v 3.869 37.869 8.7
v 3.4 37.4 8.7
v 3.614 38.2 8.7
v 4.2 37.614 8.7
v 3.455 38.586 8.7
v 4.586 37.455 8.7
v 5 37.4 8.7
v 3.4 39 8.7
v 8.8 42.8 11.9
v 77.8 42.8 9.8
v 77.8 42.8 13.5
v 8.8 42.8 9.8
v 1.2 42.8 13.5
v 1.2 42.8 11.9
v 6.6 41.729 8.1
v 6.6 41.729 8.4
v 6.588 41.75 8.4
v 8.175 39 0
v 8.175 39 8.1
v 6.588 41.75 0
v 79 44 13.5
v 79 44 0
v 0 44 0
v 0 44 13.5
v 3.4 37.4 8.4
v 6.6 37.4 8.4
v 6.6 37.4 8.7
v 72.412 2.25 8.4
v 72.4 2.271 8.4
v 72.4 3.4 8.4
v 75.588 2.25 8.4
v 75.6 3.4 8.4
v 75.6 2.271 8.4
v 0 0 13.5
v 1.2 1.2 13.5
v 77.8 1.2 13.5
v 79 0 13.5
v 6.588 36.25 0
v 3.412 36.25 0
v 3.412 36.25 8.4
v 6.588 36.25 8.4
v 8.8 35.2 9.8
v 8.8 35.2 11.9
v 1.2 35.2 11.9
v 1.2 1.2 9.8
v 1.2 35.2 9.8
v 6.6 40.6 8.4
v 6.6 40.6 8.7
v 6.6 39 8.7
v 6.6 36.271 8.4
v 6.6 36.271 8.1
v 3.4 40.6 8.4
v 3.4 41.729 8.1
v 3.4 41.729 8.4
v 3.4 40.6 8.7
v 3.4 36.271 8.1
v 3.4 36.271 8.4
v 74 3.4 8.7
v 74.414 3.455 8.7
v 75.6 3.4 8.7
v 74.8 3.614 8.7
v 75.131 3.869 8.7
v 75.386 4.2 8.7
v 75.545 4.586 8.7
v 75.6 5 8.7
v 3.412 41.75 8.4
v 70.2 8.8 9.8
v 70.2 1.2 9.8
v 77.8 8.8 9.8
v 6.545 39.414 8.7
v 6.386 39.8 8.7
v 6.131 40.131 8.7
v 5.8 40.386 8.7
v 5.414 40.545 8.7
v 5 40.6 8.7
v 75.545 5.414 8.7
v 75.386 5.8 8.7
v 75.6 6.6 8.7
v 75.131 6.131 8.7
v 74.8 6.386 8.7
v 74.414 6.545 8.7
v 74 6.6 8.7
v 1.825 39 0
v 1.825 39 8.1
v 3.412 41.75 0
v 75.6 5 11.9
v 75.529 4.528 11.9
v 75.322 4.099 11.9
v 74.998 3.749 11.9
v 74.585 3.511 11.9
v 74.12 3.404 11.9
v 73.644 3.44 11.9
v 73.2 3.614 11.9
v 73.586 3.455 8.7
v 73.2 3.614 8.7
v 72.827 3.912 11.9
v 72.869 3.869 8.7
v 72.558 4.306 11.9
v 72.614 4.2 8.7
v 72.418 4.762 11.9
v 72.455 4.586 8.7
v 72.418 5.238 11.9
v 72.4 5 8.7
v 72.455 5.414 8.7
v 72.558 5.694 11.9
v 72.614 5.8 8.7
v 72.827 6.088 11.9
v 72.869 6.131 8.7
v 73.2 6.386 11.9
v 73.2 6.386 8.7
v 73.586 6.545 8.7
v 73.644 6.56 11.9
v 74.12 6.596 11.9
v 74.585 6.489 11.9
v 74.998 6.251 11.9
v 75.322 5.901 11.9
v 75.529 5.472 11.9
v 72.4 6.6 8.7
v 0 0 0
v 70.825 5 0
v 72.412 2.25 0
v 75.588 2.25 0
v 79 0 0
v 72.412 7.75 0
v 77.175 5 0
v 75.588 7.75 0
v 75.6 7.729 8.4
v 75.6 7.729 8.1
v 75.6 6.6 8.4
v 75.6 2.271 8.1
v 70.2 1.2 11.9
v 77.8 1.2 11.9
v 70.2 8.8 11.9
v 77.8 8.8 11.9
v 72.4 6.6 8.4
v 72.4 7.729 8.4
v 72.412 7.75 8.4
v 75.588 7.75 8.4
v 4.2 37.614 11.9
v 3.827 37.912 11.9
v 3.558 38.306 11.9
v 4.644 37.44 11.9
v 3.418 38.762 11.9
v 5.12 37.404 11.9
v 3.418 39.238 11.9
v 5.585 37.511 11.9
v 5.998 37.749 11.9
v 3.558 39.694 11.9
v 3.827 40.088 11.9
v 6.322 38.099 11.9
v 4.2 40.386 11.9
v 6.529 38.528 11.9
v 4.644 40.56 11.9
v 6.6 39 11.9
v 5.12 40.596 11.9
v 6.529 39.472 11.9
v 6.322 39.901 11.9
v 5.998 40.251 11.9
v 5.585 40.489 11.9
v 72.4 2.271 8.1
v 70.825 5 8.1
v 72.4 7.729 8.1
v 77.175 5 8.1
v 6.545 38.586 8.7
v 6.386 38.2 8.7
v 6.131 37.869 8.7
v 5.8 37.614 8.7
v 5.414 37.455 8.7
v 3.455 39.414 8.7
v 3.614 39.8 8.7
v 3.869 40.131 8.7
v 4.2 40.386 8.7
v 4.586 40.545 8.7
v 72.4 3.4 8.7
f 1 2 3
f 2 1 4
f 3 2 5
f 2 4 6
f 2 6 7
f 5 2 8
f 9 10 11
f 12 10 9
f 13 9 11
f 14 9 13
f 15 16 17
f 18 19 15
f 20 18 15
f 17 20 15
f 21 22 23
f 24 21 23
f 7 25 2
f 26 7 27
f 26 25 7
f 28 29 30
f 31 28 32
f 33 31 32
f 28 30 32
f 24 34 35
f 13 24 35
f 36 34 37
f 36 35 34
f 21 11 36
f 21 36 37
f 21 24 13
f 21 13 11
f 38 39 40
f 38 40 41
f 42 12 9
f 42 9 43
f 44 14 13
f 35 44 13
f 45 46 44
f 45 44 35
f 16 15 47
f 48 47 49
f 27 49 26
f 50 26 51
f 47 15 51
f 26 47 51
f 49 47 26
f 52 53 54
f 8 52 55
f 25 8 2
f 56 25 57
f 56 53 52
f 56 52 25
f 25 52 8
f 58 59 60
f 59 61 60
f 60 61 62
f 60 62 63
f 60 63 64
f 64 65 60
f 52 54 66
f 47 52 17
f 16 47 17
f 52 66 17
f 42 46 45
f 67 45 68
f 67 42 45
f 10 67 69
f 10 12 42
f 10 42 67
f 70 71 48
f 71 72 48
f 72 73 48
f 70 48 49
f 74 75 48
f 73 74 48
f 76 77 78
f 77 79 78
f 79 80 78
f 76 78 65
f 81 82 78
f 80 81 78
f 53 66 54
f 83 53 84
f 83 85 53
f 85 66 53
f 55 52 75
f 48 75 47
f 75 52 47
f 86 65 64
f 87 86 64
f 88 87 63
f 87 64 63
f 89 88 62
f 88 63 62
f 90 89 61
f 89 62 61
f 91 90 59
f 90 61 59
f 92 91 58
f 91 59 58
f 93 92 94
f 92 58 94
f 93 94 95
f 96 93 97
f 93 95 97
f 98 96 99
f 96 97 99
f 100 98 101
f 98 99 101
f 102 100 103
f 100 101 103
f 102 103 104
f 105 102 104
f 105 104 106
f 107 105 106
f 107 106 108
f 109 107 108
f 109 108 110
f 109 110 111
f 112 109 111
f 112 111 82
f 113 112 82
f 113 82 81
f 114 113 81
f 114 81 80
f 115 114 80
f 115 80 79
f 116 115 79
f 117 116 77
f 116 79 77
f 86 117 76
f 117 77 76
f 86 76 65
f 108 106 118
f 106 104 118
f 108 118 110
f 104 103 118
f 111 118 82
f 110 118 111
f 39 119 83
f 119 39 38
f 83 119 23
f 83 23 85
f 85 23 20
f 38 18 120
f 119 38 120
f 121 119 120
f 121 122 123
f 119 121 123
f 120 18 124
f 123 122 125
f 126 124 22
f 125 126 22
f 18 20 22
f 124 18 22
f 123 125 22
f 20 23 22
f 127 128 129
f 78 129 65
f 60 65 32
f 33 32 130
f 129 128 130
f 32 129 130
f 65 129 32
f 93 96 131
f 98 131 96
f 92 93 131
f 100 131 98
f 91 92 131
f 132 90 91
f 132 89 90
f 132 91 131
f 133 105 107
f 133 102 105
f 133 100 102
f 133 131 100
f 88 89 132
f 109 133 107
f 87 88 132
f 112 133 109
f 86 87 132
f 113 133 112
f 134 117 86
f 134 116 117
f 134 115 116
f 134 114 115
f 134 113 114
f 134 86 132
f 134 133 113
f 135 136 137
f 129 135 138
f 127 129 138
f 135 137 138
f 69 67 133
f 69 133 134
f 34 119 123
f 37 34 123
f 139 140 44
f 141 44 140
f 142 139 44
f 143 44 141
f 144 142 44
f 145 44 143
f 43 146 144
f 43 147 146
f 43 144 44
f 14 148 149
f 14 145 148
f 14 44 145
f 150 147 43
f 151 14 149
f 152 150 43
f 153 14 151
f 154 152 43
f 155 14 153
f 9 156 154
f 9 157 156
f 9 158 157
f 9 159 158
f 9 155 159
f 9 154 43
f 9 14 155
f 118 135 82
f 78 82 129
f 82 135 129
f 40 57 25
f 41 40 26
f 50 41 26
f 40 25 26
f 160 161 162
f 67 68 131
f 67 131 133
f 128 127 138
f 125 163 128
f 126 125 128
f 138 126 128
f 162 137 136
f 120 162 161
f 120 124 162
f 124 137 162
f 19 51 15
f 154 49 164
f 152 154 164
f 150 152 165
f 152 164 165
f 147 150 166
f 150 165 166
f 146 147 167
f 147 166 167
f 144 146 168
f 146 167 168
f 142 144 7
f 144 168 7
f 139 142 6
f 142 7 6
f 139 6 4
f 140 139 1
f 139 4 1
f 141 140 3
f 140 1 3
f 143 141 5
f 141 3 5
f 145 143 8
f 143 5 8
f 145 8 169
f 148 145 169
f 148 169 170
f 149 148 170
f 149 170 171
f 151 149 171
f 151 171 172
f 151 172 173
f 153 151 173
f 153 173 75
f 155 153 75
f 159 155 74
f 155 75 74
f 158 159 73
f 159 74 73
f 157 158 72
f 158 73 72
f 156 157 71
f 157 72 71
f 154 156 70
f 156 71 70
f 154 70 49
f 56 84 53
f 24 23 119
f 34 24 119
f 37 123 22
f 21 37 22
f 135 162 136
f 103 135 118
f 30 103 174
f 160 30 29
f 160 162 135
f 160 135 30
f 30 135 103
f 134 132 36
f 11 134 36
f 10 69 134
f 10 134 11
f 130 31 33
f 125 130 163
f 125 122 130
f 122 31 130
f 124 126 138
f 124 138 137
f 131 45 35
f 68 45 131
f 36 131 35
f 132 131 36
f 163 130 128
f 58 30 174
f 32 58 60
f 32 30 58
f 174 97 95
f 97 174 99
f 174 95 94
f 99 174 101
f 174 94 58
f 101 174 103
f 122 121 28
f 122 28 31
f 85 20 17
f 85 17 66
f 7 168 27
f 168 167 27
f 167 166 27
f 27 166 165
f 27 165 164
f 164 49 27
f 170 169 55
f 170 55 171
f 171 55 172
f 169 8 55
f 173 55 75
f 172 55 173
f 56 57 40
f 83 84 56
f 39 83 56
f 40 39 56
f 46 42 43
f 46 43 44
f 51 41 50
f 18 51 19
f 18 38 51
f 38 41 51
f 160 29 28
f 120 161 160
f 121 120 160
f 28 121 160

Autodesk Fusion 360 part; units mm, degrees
sketch "Sketch2" plane through (0, 0, 0) normal (0, 0, 1) x (1, 0, 0)
  line L0 (0, 0) -> (79, 0)
  line L1 (79, 0) -> (79, 44)
  line L2 (79, 44) -> (0, 44)
  line L3 (0, 44) -> (0, 0)
  line L4 (1.2, 1.2) -> (77.8, 1.2)
  line L5 (77.8, 1.2) -> (77.8, 42.8)
  line L6 (77.8, 42.8) -> (1.2, 42.8)
  line L7 (1.2, 42.8) -> (1.2, 1.2)
  circle A0 centre (5, 39) radius 1.6
  line L8 (6.5877, 41.75) -> (3.4123, 41.75)
  line L9 (3.4123, 41.75) -> (1.8246, 39)
  line L10 (1.8246, 39) -> (3.4123, 36.25)
  line L11 (3.4123, 36.25) -> (6.5877, 36.25)
  line L12 (6.5877, 36.25) -> (8.1754, 39)
  line L13 (8.1754, 39) -> (6.5877, 41.75)
  line L14 (2, 2) -> (77, 2)
  line L15 (77, 2) -> (77, 42)
  line L16 (77, 42) -> (2, 42)
  line L17 (2, 42) -> (2, 2)
  line L18 (3.4, 41.75) -> (3.4, 36.25)
  line L19 (6.6, 41.75) -> (6.6, 36.25)
  line L20 (3.4, 40.6) -> (6.6, 40.6)
  line L21 (3.4, 37.4) -> (6.6, 37.4)
  circle A1 centre (74, 5) radius 1.6
  line L22 (75.5877, 7.75) -> (72.4123, 7.75)
  line L23 (72.4123, 7.75) -> (70.8246, 5)
  line L24 (70.8246, 5) -> (72.4123, 2.25)
  line L25 (72.4123, 2.25) -> (75.5877, 2.25)
  line L26 (75.5877, 2.25) -> (77.1754, 5)
  line L27 (77.1754, 5) -> (75.5877, 7.75)
  line L28 (72.4, 7.75) -> (72.4, 2.25)
  line L29 (75.6, 7.75) -> (75.6, 2.25)
  line L30 (71.7483, 6.6) -> (76.2517, 6.6)
  line L31 (71.7483, 3.4) -> (76.2517, 3.4)
  point P0 (5, 39)
  point P1 (74, 5)
  dimension "d48" = 44
  dimension "d49" = 79
  dimension "d50" = -1.2
  dimension "d55" = 3.2
  dimension "d56" = 3.8
  dimension "d57" = 3.8
  dimension "d58" = 2.75
  dimension "d59" = -2
  dimension "d60" = 3.2
  dimension "d61" = 3
  dimension "d62" = 3
  dimension "d63" = 2.75
extrude "Extrude10" add sketch "Sketch2" along normal blind 13.5 contours L0 L1 L2 L3
extrude "Extrude11" add sketch "Sketch2" along normal blind 9.8 contours L4 L5 L6 L7 | A0 | A0 L19 L21 | A0 L19 L20 | L12 L13 L19 | A0 L18 L20 | L8 L9 L13 L18 L19 L20 | A0 L18 L21 | L10 L11 L12 L18 L19 L21 | L9 L10 L17 L18 | L8 L9 L10 L11 L12 L13 L14 L15 L16 L17 L22 L23 L24 L25 L26 L27 | L9 L10 L17 | L15 L26 L27 | L15 L26 L27 L29 L30 L31 | L27 L29 L30 | L26 L29 L31 | L22 L23 L27 L28 L29 L30 | A1 L29 L30 | L24 L25 L26 L28 L29 L31 | A1 L29 L31 | A1 | A1 L28 L30 | A1 L28 L31 | L23 L24 L28 L30 L31 | L23 L28 L30 | L24 L28 L31
ref_plane "WorkPlane2" through (39.5, 22, 9.5) normal (0, 0, 1) x (1, 0, 0)
sketch "Sketch4" plane through (0, 0, 9.5) normal (0, 0, 1) x (1, 0, 0)
  line L0 (3.4, 41.75) -> (3.4, 36.25)
  line L1 (6.5877, 41.75) -> (3.4123, 41.75)
  line L2 (3.4, 40.6) -> (6.6, 40.6)
  line L3 (3.4123, 41.75) -> (1.8246, 39)
  line L4 (1.8246, 39) -> (3.4123, 36.25)
  circle A0 centre (5, 39) radius 1.6
  line L5 (3.4, 37.4) -> (6.6, 37.4)
  line L6 (3.4123, 36.25) -> (6.5877, 36.25)
  line L7 (6.6, 41.75) -> (6.6, 36.25)
  line L8 (8.1754, 39) -> (6.5877, 41.75)
  line L9 (6.5877, 36.25) -> (8.1754, 39)
  line L10 (75.5877, 7.75) -> (72.4123, 7.75)
  line L11 (72.4, 7.75) -> (72.4, 2.25)
  line L12 (71.7483, 6.6) -> (76.2517, 6.6)
  line L13 (72.4123, 7.75) -> (70.8246, 5)
  line L14 (70.8246, 5) -> (72.4123, 2.25)
  line L15 (71.7483, 3.4) -> (76.2517, 3.4)
  circle A1 centre (74, 5) radius 1.6
  line L16 (72.4123, 2.25) -> (75.5877, 2.25)
  line L17 (75.6, 7.75) -> (75.6, 2.25)
  line L18 (77.1754, 5) -> (75.5877, 7.75)
  line L19 (75.5877, 2.25) -> (77.1754, 5)
  line L20 (2, 42) -> (2, 2)
  line L21 (77, 42) -> (2, 42)
  line L22 (2, 2) -> (77, 2)
  line L23 (77, 2) -> (77, 42)
  line L24 (77.8, 42.8) -> (1.2, 42.8)
  line L25 (77.8, 1.2) -> (77.8, 42.8)
  line L26 (1.2, 1.2) -> (77.8, 1.2)
  line L27 (1.2, 42.8) -> (1.2, 1.2)
  line L28 (0, 0) -> (79, 0)
  line L29 (0, 44) -> (0, 0)
  line L30 (79, 0) -> (79, 44)
  line L31 (79, 44) -> (0, 44)
  line L32 (1.2, 42.8) -> (8.8, 42.8)
  line L33 (8.8, 42.8) -> (8.8, 35.2)
  line L34 (8.8, 35.2) -> (1.2, 35.2)
  line L35 (1.2, 35.2) -> (1.2, 42.8)
  line L36 (77.8, 1.2) -> (70.2, 1.2)
  line L37 (70.2, 1.2) -> (70.2, 8.8)
  line L38 (70.2, 8.8) -> (77.8, 8.8)
  line L39 (77.8, 8.8) -> (77.8, 1.2)
  dimension "d90" = 7.6
  dimension "d91" = 7.6
  dimension "d92" = 7.6
  dimension "d93" = 7.6
extrude "Extrude12" cut sketch "Sketch2" along normal blind 14 contours A0
extrude "Extrude13" cut sketch "Sketch2" along normal blind 8.7 contours A0 L19 L21 | A0 L19 L20 | A0 L18 L20 | A0 L18 L21
extrude "Extrude14" cut sketch "Sketch2" along normal blind 8.4 contours L8 L9 L13 L18 L19 L20 | L10 L11 L12 L18 L19 L21
extrude "Extrude15" cut sketch "Sketch2" along normal blind 8.1 contours L12 L13 L19 | L9 L10 L17 L18
extrude "Extrude16" cut sketch "Sketch2" along normal blind 8.1 contours L9 L10 L17
extrude "Extrude17" cut sketch "Sketch2" along normal blind 8.1 contours L15 L26 L27 | L15 L26 L27 L29 L30 L31 | L27 L29 L30 | L26 L29 L31 | L23 L24 L28 L30 L31 | L23 L28 L30 | L24 L28 L31
extrude "Extrude18" cut sketch "Sketch2" along normal blind 8.4 contours L22 L23 L27 L28 L29 L30 | L24 L25 L26 L28 L29 L31
extrude "Extrude19" cut sketch "Sketch2" along normal blind 8.7 contours A1 L29 L30 | A1 L29 L31 | A1 L28 L30 | A1 L28 L31
extrude "Extrude20" cut sketch "Sketch2" along normal blind 14 contours A1
ref_plane "WorkPlane3" through (39.5, 22, 9.8) normal (0, 0, 1) x (1, 0, 0)
sketch "Sketch5" plane through (0, 0, 9.8) normal (0, 0, 1) x (1, 0, 0)
  line L0 (70.2, 8.8) -> (77.8, 8.8)
  line L1 (70.2, 1.2) -> (70.2, 8.8)
  line L2 (77.8, 1.2) -> (70.2, 1.2)
  line L3 (77.8, 8.8) -> (77.8, 1.2)
  line L4 (8.8, 35.2) -> (1.2, 35.2)
  line L5 (8.8, 42.8) -> (8.8, 35.2)
  line L6 (1.2, 35.2) -> (1.2, 42.8)
  line L7 (1.2, 42.8) -> (8.8, 42.8)
  circle A0 centre (5, 39) radius 1.6
  circle A1 centre (74, 5) radius 1.6
extrude "Extrude22" add sketch "Sketch5" along normal blind 2.1 contours L4 L5 L6 L7
extrude "Extrude23" add sketch "Sketch5" along normal blind 2.1 contours L0 L1 L2 L3
